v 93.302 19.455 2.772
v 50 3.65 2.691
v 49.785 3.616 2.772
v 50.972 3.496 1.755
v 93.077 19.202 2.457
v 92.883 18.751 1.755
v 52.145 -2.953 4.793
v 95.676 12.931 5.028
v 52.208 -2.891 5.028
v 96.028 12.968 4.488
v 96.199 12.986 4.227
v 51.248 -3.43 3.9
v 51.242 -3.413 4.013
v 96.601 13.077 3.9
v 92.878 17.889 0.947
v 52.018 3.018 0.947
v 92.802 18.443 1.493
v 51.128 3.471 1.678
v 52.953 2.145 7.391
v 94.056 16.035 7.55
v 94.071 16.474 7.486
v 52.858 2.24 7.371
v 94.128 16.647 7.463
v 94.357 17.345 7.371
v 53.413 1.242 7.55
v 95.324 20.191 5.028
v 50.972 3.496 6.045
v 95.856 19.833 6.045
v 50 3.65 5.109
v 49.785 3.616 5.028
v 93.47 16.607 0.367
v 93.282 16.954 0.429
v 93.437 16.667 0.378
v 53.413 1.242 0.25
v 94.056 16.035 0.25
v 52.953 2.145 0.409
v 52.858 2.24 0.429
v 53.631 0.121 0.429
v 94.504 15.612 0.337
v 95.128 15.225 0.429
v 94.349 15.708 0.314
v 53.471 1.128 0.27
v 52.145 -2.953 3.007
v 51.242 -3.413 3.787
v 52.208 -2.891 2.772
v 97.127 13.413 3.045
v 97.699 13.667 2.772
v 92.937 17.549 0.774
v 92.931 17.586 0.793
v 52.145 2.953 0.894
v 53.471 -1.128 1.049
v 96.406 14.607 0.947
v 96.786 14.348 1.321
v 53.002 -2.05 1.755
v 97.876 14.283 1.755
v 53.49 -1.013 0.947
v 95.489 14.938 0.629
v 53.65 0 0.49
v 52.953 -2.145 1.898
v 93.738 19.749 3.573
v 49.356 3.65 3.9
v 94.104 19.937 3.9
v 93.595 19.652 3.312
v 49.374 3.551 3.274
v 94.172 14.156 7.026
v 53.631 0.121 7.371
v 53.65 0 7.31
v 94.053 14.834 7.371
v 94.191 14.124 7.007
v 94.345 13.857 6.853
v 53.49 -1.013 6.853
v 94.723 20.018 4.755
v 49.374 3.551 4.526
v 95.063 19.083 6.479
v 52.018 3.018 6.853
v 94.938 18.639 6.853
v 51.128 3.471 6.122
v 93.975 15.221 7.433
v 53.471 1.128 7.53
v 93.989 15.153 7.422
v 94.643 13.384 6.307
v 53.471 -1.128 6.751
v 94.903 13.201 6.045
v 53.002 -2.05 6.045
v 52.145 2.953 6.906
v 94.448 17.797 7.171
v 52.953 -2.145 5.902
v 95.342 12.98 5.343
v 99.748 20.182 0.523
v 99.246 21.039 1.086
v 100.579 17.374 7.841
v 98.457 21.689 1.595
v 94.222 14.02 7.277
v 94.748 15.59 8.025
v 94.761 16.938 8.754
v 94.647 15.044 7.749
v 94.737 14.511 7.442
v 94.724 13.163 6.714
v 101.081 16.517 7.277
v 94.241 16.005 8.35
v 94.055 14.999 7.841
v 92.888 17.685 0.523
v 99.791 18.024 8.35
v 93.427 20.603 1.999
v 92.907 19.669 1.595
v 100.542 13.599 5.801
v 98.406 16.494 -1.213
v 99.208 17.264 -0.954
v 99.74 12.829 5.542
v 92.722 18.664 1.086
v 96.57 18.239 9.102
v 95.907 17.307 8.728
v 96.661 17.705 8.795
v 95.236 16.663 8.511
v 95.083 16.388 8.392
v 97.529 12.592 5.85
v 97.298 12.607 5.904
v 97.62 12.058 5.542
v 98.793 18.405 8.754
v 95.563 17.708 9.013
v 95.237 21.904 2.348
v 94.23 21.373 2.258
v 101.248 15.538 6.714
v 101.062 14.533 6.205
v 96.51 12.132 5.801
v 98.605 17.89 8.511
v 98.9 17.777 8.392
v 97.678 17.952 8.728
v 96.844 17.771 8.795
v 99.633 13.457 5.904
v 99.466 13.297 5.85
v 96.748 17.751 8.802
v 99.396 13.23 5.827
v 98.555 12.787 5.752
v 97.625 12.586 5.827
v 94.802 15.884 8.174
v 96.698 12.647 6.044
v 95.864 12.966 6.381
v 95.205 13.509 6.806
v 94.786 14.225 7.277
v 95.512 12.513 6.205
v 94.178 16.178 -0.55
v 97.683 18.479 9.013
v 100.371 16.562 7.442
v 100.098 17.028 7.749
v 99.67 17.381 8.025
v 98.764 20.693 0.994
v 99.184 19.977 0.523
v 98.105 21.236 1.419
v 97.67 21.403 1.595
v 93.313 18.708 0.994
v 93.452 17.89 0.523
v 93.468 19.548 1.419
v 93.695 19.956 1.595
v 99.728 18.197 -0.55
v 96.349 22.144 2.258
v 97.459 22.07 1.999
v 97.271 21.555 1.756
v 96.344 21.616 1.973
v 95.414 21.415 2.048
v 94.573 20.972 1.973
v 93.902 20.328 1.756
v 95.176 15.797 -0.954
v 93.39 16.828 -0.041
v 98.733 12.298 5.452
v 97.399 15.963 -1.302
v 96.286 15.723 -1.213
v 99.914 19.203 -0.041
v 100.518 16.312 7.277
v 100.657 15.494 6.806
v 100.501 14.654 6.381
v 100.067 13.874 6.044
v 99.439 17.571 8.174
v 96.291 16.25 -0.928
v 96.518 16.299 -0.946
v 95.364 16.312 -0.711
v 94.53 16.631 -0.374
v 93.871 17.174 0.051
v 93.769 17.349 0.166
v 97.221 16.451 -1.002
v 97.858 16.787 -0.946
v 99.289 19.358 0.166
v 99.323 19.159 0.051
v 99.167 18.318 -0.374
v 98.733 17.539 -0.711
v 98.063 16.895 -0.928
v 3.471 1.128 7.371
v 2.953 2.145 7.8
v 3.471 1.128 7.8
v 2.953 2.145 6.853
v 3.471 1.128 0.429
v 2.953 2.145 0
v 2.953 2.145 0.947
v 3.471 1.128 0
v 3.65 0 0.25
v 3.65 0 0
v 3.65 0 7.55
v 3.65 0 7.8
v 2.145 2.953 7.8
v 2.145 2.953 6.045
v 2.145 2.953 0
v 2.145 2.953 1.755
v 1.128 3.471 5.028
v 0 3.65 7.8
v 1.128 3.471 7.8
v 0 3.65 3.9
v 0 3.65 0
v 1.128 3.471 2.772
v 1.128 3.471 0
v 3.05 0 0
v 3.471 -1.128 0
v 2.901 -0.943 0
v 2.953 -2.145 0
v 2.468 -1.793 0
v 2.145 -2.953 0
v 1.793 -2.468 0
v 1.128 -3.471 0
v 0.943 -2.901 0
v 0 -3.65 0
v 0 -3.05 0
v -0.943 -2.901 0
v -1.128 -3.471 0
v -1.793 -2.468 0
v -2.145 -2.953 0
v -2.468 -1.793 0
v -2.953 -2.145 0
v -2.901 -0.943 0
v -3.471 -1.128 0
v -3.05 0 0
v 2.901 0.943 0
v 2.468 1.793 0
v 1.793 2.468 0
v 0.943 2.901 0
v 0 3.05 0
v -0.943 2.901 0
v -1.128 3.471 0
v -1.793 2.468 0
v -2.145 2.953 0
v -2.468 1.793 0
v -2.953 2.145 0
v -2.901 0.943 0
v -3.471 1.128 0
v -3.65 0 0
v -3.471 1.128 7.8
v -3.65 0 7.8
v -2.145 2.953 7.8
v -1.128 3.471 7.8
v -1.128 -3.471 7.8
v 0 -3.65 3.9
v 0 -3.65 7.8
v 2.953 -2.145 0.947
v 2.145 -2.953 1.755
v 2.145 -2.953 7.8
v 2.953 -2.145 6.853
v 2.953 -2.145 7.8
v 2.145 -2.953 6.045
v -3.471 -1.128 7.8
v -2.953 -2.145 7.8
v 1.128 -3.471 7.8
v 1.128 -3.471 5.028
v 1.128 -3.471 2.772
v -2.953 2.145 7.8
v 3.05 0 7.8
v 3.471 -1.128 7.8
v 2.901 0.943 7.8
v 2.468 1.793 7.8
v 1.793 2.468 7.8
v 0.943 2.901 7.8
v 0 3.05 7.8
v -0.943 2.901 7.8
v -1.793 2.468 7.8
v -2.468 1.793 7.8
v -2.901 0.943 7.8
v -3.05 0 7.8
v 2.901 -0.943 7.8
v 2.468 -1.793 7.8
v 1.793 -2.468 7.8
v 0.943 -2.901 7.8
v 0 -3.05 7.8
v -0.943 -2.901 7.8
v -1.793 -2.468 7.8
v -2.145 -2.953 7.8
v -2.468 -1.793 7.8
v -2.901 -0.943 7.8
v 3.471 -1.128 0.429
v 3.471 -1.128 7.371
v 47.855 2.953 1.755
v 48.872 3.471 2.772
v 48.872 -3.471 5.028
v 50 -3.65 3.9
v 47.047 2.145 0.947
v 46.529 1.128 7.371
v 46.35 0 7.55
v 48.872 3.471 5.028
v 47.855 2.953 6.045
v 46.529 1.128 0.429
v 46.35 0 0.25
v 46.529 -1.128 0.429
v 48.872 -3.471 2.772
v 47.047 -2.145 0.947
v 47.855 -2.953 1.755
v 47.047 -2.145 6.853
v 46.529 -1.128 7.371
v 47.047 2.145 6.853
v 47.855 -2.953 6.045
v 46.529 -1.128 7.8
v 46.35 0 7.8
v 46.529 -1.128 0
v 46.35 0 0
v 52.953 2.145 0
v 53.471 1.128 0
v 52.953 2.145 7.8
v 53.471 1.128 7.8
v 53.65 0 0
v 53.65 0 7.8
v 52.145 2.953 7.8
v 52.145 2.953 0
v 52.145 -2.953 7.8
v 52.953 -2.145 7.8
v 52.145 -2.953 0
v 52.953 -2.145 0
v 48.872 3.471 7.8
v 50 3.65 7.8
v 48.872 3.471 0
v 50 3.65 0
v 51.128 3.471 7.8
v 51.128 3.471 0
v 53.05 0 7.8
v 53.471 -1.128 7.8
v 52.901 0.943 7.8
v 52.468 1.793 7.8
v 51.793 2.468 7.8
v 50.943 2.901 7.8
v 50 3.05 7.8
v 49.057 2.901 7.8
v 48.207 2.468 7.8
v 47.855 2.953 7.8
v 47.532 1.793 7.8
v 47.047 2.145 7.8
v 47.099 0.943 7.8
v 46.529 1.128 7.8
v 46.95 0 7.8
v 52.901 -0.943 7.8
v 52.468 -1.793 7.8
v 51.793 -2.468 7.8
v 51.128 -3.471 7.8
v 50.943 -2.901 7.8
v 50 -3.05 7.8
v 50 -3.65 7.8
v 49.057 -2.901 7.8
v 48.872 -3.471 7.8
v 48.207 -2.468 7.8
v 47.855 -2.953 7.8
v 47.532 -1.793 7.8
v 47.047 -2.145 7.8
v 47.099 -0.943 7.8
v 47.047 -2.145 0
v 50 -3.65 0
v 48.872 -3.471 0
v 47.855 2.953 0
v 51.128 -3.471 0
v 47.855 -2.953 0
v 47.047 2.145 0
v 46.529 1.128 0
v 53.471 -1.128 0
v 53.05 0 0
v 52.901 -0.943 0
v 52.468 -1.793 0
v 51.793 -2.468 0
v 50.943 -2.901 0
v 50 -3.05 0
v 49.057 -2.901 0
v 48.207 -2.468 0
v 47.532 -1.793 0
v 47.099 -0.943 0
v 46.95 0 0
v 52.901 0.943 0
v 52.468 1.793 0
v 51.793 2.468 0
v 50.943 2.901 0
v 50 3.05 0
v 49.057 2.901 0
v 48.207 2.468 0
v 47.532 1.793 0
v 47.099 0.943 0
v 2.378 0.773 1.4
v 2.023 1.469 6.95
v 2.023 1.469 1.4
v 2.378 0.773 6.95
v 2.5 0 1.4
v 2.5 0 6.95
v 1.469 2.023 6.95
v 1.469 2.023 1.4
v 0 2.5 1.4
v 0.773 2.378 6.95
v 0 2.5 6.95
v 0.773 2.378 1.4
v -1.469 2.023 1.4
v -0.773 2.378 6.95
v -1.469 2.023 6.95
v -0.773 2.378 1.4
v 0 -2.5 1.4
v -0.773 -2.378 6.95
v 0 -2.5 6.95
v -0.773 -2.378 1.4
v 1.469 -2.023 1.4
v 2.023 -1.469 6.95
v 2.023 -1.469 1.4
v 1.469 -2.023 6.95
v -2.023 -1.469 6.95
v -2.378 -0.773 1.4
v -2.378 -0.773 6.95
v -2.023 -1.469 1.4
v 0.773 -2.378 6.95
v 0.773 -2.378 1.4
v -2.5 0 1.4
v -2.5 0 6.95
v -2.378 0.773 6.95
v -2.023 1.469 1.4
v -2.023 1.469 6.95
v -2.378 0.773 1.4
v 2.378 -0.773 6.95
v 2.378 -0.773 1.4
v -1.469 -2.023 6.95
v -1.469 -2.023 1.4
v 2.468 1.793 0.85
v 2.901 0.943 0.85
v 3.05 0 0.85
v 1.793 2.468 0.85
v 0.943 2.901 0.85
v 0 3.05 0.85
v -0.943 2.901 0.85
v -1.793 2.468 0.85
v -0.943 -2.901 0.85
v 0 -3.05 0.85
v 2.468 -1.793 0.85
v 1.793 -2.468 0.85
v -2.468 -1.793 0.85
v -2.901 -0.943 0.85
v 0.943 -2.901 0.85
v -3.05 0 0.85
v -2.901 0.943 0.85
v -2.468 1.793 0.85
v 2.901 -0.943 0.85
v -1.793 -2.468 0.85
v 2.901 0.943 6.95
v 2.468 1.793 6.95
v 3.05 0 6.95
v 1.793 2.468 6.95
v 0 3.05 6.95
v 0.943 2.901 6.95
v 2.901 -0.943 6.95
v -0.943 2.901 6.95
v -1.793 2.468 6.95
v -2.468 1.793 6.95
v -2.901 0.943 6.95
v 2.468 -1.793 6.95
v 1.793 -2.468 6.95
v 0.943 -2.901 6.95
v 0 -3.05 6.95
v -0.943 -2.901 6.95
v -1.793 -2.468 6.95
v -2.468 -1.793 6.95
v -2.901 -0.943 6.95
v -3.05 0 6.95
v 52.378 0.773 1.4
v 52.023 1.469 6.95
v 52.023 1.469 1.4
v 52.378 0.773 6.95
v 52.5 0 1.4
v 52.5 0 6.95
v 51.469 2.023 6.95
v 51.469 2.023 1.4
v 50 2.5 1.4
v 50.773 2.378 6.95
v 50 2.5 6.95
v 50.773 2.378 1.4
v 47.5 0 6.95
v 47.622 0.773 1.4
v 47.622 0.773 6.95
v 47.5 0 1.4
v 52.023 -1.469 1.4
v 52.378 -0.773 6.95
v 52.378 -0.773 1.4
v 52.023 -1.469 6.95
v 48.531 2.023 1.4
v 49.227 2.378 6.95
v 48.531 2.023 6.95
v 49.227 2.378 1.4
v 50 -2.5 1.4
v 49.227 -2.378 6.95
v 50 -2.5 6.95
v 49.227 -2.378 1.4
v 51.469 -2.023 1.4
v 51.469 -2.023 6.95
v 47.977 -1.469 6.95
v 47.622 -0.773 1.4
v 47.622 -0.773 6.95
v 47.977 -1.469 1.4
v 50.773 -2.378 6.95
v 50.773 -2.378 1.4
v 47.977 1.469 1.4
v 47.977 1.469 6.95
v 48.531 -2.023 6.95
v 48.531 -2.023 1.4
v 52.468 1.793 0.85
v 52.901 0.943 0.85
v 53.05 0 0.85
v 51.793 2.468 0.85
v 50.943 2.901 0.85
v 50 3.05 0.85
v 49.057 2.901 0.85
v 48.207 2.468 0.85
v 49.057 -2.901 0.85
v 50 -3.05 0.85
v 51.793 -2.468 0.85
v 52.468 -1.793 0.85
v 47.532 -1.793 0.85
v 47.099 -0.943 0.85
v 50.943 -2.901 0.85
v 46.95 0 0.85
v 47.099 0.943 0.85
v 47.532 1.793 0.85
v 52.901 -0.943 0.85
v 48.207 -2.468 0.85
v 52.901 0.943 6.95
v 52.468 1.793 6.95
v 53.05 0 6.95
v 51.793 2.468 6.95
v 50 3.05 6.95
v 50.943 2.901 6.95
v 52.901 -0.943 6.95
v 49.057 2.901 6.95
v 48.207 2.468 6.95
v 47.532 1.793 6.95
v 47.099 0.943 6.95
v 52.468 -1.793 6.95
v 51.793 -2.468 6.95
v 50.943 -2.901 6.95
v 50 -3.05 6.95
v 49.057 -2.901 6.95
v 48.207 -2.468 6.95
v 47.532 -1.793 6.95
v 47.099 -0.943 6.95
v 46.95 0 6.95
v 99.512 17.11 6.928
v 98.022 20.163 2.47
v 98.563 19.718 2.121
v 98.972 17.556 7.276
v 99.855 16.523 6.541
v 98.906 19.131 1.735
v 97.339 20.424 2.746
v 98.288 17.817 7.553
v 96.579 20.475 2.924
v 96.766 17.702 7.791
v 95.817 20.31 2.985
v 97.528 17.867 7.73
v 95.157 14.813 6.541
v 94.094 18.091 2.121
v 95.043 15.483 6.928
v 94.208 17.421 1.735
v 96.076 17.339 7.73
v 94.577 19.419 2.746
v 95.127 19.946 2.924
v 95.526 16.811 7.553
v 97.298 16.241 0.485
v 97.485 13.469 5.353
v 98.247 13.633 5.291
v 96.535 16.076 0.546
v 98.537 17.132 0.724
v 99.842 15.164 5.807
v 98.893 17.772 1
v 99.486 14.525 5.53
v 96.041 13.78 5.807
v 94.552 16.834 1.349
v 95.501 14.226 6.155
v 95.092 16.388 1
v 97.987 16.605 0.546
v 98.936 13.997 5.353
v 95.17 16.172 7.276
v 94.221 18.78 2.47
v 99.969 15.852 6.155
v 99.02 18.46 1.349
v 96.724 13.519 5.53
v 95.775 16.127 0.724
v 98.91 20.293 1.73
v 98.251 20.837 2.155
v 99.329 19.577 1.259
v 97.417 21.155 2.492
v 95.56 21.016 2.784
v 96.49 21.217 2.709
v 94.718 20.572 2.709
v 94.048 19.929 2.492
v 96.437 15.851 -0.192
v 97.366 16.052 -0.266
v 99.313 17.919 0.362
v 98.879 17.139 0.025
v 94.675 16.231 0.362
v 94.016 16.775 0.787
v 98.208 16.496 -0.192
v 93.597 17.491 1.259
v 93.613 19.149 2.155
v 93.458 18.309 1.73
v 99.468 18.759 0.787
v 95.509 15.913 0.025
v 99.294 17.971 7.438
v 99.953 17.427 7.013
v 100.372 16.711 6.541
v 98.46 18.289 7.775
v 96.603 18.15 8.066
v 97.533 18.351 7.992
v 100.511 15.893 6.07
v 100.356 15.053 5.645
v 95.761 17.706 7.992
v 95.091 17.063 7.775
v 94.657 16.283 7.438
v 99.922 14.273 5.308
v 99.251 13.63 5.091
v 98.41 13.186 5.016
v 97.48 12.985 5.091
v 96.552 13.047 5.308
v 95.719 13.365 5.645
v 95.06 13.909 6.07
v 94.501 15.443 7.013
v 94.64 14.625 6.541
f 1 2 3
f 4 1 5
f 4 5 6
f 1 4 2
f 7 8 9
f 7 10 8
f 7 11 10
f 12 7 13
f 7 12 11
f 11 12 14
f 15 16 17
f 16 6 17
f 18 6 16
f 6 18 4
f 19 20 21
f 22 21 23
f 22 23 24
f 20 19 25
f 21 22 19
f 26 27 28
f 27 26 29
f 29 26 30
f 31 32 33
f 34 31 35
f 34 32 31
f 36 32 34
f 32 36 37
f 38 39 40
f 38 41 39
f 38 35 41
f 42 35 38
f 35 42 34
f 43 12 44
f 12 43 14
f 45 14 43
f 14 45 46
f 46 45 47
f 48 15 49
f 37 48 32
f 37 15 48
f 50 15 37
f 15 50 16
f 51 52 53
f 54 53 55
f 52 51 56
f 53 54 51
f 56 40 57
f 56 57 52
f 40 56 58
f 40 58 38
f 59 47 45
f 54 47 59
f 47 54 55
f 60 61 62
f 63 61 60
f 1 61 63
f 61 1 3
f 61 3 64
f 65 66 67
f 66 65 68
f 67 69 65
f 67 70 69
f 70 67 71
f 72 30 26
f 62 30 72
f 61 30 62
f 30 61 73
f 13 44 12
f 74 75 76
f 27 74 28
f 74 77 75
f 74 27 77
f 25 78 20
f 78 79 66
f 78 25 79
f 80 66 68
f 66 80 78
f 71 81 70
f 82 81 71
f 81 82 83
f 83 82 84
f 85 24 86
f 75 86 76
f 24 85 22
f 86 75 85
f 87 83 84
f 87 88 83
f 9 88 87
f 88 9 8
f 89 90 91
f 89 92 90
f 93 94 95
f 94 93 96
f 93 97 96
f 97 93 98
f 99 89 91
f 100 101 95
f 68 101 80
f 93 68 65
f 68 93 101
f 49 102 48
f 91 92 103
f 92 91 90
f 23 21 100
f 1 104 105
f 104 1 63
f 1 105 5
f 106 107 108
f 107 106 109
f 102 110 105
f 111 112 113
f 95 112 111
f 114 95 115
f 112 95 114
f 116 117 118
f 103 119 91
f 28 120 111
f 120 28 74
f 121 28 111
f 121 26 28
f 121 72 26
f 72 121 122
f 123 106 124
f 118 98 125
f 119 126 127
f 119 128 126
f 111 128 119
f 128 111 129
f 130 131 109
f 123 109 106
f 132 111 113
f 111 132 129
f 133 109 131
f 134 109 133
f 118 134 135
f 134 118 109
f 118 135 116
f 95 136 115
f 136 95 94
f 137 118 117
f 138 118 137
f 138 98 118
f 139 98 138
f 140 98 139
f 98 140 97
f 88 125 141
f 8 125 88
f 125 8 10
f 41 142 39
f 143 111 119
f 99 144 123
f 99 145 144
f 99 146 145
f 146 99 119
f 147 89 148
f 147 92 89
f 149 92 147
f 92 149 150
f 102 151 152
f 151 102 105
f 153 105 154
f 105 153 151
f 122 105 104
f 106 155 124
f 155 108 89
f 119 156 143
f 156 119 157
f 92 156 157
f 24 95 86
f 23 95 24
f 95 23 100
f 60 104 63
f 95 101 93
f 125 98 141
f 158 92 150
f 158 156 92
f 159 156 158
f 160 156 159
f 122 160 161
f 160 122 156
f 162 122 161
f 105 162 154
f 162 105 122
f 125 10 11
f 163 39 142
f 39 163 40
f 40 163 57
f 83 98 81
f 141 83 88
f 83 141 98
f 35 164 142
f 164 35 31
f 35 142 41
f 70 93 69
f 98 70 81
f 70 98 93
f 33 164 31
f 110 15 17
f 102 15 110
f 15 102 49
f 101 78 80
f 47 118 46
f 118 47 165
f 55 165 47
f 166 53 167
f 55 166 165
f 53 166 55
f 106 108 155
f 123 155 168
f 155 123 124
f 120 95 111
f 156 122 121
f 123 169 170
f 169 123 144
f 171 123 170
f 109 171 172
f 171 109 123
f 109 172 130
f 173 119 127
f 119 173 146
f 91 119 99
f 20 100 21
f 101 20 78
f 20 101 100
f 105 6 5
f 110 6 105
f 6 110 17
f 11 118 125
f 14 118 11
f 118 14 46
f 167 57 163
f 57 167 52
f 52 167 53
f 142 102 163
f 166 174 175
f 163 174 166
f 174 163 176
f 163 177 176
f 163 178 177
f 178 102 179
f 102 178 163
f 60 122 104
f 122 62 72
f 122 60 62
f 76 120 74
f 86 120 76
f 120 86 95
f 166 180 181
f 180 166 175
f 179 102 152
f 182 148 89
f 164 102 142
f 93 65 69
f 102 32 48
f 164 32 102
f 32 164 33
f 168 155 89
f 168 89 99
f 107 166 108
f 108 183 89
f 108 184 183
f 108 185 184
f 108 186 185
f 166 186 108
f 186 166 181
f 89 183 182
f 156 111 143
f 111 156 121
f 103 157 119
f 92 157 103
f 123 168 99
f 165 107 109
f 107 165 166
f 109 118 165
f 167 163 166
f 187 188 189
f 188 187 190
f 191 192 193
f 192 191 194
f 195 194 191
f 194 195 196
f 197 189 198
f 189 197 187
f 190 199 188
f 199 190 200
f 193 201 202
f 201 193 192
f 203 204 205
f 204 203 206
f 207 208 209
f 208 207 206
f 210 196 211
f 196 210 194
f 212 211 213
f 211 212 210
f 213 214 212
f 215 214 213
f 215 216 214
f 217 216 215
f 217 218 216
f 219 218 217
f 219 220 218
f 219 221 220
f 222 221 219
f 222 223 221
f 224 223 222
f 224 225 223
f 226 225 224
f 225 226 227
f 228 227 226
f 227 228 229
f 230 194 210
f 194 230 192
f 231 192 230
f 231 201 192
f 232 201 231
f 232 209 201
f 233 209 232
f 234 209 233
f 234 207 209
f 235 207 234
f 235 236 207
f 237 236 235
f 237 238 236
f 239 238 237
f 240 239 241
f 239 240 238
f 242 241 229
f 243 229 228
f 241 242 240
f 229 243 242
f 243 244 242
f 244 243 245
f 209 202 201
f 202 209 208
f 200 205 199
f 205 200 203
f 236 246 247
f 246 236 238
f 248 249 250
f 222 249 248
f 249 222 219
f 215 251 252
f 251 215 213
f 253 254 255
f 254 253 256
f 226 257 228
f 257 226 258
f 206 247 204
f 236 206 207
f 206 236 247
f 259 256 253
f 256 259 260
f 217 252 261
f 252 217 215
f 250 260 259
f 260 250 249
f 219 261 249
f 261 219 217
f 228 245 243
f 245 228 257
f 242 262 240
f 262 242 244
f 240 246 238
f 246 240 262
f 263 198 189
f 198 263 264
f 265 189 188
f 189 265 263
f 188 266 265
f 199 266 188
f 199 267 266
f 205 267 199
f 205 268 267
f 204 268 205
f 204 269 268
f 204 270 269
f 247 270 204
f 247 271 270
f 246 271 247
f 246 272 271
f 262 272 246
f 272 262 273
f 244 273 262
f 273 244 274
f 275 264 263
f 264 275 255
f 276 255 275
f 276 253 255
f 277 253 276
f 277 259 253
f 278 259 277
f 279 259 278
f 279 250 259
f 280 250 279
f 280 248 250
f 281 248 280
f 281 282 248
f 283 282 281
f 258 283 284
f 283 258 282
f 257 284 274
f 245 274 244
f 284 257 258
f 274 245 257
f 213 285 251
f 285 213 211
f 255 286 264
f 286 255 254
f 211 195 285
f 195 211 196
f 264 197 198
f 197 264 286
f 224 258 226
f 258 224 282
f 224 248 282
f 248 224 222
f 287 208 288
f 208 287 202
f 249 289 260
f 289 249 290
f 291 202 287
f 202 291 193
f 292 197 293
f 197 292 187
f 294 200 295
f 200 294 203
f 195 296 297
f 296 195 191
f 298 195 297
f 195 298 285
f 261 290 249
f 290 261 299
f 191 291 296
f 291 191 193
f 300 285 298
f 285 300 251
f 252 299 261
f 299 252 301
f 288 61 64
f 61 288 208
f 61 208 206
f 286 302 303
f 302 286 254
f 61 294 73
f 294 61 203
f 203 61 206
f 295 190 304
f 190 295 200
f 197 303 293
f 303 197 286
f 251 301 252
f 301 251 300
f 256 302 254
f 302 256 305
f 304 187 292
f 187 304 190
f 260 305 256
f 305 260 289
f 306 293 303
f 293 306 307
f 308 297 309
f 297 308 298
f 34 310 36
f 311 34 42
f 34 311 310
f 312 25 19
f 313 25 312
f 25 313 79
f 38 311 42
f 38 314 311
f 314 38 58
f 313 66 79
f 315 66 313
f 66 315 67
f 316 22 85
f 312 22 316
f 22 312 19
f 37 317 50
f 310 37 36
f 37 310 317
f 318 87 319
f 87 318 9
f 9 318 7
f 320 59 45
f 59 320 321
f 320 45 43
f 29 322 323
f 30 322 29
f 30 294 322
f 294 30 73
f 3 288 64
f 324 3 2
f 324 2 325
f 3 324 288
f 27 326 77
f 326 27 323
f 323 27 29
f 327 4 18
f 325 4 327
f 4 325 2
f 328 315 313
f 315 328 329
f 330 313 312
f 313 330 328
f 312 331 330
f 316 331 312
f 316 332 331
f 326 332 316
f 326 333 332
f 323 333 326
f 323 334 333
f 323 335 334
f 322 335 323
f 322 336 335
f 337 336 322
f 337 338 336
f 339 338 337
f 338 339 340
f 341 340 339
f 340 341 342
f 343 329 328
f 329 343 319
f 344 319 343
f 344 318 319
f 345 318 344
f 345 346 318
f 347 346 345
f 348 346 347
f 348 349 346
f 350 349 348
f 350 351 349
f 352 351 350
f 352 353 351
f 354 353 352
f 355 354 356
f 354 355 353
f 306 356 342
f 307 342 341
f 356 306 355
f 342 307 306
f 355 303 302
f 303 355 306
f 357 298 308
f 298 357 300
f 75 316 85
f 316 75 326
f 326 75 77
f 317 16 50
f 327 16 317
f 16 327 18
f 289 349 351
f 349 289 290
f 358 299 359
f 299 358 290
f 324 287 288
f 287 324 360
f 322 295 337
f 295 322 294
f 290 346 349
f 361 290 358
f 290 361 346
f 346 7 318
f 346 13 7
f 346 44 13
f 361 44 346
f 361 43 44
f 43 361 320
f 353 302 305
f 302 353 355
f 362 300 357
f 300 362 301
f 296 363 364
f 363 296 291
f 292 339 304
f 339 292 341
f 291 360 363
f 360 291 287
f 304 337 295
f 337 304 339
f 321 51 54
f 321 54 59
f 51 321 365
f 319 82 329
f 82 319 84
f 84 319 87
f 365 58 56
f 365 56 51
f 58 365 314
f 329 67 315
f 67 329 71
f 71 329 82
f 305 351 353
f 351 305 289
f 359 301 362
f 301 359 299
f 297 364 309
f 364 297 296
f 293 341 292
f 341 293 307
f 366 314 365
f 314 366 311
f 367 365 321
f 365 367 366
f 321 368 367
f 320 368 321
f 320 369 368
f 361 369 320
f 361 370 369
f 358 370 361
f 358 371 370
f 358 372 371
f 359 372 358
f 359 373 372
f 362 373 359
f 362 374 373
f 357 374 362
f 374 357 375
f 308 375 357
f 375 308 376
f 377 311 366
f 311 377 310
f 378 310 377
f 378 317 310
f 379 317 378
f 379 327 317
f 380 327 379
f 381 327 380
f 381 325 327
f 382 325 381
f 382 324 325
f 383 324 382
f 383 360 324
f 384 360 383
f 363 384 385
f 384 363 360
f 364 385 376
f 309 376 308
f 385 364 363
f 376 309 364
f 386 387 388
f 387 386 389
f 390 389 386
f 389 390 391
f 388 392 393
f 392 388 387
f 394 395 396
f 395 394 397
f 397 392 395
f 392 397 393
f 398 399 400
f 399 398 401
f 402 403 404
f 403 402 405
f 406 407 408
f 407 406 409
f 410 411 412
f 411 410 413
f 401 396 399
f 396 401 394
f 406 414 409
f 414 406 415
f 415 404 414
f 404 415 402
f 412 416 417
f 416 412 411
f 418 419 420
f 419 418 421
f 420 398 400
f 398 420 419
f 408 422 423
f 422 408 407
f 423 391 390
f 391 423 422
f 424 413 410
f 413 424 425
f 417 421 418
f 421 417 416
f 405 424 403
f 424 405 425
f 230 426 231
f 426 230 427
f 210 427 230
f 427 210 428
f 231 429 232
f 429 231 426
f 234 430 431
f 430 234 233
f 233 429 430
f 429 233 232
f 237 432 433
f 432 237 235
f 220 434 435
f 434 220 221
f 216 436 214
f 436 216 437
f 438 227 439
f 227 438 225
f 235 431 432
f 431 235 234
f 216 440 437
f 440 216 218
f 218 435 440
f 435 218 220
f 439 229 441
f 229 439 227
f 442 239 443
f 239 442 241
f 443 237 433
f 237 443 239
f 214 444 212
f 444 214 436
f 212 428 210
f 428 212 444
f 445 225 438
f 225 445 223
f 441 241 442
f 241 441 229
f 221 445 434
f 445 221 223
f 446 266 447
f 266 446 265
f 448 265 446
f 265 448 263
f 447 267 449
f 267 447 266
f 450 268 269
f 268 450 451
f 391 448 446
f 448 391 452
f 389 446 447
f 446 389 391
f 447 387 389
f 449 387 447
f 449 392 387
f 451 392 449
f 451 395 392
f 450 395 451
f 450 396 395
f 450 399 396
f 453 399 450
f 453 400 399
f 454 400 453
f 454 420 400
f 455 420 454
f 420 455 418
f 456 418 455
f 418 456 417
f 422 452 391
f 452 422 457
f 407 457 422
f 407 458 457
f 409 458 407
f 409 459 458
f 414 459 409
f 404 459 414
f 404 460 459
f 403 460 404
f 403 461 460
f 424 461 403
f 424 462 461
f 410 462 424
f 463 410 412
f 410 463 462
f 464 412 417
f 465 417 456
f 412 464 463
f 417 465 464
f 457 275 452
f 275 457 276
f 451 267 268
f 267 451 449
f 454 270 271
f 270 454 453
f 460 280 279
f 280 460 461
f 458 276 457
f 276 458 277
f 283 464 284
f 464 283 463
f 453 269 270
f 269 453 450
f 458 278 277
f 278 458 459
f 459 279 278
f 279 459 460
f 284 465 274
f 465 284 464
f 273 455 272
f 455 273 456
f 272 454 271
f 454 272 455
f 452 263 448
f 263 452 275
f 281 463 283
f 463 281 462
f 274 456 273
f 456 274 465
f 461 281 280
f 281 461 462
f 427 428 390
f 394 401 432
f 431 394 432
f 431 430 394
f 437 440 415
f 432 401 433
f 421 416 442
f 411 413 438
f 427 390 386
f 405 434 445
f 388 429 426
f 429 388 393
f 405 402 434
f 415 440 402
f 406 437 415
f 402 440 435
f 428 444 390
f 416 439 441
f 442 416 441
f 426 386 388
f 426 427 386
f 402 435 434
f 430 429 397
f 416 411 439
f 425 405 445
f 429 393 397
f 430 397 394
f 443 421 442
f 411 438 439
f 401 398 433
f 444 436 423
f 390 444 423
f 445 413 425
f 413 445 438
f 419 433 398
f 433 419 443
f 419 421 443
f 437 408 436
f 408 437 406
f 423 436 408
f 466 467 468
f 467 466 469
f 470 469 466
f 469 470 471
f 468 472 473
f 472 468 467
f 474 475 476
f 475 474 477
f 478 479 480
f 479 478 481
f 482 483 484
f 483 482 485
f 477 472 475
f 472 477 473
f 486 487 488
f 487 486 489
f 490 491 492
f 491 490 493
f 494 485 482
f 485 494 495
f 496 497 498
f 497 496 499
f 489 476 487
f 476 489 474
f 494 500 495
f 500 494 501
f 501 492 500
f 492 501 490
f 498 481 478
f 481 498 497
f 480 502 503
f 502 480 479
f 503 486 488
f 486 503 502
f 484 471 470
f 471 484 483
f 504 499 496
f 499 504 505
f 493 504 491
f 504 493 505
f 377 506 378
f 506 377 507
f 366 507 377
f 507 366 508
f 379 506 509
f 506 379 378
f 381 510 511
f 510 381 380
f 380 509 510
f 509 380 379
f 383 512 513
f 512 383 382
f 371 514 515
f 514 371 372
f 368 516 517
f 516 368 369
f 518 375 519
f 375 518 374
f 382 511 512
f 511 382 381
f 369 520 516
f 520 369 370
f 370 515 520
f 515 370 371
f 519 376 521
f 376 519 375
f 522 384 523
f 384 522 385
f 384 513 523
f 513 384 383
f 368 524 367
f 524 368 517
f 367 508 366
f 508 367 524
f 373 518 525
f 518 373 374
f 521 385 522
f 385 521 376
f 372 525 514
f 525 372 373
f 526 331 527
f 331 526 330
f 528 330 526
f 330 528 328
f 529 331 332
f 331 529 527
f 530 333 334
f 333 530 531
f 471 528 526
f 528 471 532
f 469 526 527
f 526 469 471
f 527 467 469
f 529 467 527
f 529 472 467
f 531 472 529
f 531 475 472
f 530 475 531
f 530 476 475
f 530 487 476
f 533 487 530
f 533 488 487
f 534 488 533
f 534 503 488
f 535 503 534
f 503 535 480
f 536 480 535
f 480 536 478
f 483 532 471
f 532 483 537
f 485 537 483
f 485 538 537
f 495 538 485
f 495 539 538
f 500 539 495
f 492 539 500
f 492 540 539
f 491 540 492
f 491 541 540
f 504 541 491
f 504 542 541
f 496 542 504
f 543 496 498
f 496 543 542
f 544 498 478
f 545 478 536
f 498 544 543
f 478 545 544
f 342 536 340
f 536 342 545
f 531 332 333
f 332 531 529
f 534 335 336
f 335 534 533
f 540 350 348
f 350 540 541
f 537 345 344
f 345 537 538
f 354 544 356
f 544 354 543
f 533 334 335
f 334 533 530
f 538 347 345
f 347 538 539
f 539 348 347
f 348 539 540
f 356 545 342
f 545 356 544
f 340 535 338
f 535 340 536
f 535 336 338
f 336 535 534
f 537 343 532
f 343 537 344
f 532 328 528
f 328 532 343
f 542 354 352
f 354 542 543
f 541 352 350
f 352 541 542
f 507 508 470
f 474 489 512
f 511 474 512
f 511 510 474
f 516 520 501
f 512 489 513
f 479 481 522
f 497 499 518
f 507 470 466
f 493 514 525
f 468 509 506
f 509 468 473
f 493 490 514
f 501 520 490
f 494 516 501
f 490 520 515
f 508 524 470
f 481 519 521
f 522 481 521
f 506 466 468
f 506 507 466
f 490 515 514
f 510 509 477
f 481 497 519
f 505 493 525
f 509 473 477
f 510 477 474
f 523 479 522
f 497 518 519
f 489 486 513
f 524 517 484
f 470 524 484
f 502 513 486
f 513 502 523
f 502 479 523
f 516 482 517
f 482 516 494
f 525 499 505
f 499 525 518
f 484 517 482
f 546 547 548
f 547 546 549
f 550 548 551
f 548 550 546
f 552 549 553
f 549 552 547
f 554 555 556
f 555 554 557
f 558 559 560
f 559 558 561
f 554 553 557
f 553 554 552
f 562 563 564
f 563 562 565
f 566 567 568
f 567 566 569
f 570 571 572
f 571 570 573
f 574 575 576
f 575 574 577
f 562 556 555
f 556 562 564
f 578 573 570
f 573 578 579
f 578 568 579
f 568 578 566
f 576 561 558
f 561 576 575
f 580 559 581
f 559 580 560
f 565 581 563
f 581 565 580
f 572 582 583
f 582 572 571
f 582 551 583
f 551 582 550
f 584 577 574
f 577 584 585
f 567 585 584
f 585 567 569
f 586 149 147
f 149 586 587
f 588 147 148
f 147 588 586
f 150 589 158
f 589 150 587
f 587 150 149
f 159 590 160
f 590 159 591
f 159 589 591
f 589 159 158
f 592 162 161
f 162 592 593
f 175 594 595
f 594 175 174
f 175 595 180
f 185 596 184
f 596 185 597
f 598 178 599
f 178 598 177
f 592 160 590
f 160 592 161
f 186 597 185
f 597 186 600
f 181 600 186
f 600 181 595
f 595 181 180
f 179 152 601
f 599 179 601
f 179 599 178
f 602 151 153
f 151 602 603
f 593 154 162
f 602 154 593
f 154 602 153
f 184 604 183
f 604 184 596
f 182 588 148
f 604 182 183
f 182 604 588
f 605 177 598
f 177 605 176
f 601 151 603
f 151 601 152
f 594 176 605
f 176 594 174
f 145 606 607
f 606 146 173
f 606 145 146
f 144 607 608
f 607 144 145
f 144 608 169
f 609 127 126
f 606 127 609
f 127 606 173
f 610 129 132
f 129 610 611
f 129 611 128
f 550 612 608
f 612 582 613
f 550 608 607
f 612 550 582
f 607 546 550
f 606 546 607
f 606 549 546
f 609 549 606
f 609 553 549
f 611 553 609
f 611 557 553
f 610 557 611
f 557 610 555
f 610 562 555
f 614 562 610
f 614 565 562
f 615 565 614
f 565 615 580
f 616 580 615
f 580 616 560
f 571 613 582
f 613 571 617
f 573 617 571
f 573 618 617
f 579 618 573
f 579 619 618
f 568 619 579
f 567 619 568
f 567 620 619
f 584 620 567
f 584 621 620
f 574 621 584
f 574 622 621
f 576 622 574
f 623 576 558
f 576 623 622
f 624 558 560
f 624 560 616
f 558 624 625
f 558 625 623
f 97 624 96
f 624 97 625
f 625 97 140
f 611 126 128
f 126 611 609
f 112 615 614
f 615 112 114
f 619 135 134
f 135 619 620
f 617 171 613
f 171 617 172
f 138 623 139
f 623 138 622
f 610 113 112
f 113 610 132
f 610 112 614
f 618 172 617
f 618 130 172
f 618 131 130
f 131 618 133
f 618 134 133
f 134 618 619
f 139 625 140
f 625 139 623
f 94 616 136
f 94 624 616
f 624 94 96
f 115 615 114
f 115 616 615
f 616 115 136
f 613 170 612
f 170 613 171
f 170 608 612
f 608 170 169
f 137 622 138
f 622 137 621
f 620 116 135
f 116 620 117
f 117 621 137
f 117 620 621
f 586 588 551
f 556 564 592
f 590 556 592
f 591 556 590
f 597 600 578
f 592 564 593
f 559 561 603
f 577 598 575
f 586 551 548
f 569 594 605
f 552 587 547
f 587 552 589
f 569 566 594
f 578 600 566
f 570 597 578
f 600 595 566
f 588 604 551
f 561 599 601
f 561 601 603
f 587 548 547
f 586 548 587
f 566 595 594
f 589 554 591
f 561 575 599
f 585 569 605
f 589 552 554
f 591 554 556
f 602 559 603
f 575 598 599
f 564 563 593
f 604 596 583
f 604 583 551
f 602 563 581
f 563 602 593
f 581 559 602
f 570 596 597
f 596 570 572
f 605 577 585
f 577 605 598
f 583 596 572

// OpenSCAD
/*      
Customizable freeform-3-hole LEGO Technic Connector Bone - variant A (with cylinders and a twist)
Jens Henrik Sandell
July 2016

Created by forking the thing:629875
        Customizable Curved LEGO Technic Beam
        Steve Medwin
        January 2015
*/
$fn=20*1.0;
// preview[view:north east, tilt:top]

// constants
width = 7.3*1.0; // beam width
height = 7.8*1.0; // beam height
hole = 5.0/2; // hole diameter
counter = 6.1/2; // countersink diameter
depth = 0.85*1.0; // countersink depth
pitch = 8.0*1.0; // distance between holes

// user parameters
// distance between first and mid hole =
Distance1 = 50; // [20:100]
// distance between mid and last hole =
Distance2 = 50; // [20:60]
// twist =
Twist_Hole_3 = 30; // [-90:90]
// angle between first and second bone =
AngleBones = 20.0; // [0.0:90]
// degrees between adjacent holes
BoneFactor = 1.0; // [0.5,0.6,0.7,0.8,0.9,1.0]

// calculations
// create beam
difference()
{
	union(){
		cylinder(h=height, r=width/2);
		translate([0,0,height/2]) rotate([0,90,0]) cylinder(h=Distance1,r=BoneFactor*width/2);
		translate([Distance1,0,0]) cylinder(h=height,r=width/2);

		translate([Distance1,0,0]) rotate([0,0,AngleBones]) {
			translate([0,0,height/2]) rotate([0,90,0]) cylinder(h=Distance2,r=BoneFactor*width/2);
			translate([Distance2,0,height/2]) rotate([Twist_Hole_3,0,0]) cylinder(h=height,r=width/2,center=true);
		}
	}
	for (i=[0:1]) {
		translate([i*Distance1,0,0]) {
			translate([0,0,-2])
			cylinder(h=height+4, r=hole);
                
			translate([0,0,-0.01])
			cylinder(h=depth+0.01, r=counter);      
                
			translate([0,0,height-depth])
			cylinder(h=depth+0.01, r=counter);
                
			translate([0,0,depth])
			cylinder(h=(counter - hole), r1=counter, r2=hole);           
		}    
	}
	translate([Distance1,0,0]) rotate([0,0,AngleBones]) translate([Distance2,0,height/2]) rotate([Twist_Hole_3,0,0]) translate([0,0,-height/2]) {
		translate([0,0,-2])
		cylinder(h=height+4, r=hole);
               
		translate([0,0,-0.01])
		cylinder(h=depth+0.01, r=counter);      
                
		translate([0,0,height-depth])
		cylinder(h=depth+0.01, r=counter);
                
		translate([0,0,depth])
		cylinder(h=(counter - hole), r1=counter, r2=hole);           
	}    
}

